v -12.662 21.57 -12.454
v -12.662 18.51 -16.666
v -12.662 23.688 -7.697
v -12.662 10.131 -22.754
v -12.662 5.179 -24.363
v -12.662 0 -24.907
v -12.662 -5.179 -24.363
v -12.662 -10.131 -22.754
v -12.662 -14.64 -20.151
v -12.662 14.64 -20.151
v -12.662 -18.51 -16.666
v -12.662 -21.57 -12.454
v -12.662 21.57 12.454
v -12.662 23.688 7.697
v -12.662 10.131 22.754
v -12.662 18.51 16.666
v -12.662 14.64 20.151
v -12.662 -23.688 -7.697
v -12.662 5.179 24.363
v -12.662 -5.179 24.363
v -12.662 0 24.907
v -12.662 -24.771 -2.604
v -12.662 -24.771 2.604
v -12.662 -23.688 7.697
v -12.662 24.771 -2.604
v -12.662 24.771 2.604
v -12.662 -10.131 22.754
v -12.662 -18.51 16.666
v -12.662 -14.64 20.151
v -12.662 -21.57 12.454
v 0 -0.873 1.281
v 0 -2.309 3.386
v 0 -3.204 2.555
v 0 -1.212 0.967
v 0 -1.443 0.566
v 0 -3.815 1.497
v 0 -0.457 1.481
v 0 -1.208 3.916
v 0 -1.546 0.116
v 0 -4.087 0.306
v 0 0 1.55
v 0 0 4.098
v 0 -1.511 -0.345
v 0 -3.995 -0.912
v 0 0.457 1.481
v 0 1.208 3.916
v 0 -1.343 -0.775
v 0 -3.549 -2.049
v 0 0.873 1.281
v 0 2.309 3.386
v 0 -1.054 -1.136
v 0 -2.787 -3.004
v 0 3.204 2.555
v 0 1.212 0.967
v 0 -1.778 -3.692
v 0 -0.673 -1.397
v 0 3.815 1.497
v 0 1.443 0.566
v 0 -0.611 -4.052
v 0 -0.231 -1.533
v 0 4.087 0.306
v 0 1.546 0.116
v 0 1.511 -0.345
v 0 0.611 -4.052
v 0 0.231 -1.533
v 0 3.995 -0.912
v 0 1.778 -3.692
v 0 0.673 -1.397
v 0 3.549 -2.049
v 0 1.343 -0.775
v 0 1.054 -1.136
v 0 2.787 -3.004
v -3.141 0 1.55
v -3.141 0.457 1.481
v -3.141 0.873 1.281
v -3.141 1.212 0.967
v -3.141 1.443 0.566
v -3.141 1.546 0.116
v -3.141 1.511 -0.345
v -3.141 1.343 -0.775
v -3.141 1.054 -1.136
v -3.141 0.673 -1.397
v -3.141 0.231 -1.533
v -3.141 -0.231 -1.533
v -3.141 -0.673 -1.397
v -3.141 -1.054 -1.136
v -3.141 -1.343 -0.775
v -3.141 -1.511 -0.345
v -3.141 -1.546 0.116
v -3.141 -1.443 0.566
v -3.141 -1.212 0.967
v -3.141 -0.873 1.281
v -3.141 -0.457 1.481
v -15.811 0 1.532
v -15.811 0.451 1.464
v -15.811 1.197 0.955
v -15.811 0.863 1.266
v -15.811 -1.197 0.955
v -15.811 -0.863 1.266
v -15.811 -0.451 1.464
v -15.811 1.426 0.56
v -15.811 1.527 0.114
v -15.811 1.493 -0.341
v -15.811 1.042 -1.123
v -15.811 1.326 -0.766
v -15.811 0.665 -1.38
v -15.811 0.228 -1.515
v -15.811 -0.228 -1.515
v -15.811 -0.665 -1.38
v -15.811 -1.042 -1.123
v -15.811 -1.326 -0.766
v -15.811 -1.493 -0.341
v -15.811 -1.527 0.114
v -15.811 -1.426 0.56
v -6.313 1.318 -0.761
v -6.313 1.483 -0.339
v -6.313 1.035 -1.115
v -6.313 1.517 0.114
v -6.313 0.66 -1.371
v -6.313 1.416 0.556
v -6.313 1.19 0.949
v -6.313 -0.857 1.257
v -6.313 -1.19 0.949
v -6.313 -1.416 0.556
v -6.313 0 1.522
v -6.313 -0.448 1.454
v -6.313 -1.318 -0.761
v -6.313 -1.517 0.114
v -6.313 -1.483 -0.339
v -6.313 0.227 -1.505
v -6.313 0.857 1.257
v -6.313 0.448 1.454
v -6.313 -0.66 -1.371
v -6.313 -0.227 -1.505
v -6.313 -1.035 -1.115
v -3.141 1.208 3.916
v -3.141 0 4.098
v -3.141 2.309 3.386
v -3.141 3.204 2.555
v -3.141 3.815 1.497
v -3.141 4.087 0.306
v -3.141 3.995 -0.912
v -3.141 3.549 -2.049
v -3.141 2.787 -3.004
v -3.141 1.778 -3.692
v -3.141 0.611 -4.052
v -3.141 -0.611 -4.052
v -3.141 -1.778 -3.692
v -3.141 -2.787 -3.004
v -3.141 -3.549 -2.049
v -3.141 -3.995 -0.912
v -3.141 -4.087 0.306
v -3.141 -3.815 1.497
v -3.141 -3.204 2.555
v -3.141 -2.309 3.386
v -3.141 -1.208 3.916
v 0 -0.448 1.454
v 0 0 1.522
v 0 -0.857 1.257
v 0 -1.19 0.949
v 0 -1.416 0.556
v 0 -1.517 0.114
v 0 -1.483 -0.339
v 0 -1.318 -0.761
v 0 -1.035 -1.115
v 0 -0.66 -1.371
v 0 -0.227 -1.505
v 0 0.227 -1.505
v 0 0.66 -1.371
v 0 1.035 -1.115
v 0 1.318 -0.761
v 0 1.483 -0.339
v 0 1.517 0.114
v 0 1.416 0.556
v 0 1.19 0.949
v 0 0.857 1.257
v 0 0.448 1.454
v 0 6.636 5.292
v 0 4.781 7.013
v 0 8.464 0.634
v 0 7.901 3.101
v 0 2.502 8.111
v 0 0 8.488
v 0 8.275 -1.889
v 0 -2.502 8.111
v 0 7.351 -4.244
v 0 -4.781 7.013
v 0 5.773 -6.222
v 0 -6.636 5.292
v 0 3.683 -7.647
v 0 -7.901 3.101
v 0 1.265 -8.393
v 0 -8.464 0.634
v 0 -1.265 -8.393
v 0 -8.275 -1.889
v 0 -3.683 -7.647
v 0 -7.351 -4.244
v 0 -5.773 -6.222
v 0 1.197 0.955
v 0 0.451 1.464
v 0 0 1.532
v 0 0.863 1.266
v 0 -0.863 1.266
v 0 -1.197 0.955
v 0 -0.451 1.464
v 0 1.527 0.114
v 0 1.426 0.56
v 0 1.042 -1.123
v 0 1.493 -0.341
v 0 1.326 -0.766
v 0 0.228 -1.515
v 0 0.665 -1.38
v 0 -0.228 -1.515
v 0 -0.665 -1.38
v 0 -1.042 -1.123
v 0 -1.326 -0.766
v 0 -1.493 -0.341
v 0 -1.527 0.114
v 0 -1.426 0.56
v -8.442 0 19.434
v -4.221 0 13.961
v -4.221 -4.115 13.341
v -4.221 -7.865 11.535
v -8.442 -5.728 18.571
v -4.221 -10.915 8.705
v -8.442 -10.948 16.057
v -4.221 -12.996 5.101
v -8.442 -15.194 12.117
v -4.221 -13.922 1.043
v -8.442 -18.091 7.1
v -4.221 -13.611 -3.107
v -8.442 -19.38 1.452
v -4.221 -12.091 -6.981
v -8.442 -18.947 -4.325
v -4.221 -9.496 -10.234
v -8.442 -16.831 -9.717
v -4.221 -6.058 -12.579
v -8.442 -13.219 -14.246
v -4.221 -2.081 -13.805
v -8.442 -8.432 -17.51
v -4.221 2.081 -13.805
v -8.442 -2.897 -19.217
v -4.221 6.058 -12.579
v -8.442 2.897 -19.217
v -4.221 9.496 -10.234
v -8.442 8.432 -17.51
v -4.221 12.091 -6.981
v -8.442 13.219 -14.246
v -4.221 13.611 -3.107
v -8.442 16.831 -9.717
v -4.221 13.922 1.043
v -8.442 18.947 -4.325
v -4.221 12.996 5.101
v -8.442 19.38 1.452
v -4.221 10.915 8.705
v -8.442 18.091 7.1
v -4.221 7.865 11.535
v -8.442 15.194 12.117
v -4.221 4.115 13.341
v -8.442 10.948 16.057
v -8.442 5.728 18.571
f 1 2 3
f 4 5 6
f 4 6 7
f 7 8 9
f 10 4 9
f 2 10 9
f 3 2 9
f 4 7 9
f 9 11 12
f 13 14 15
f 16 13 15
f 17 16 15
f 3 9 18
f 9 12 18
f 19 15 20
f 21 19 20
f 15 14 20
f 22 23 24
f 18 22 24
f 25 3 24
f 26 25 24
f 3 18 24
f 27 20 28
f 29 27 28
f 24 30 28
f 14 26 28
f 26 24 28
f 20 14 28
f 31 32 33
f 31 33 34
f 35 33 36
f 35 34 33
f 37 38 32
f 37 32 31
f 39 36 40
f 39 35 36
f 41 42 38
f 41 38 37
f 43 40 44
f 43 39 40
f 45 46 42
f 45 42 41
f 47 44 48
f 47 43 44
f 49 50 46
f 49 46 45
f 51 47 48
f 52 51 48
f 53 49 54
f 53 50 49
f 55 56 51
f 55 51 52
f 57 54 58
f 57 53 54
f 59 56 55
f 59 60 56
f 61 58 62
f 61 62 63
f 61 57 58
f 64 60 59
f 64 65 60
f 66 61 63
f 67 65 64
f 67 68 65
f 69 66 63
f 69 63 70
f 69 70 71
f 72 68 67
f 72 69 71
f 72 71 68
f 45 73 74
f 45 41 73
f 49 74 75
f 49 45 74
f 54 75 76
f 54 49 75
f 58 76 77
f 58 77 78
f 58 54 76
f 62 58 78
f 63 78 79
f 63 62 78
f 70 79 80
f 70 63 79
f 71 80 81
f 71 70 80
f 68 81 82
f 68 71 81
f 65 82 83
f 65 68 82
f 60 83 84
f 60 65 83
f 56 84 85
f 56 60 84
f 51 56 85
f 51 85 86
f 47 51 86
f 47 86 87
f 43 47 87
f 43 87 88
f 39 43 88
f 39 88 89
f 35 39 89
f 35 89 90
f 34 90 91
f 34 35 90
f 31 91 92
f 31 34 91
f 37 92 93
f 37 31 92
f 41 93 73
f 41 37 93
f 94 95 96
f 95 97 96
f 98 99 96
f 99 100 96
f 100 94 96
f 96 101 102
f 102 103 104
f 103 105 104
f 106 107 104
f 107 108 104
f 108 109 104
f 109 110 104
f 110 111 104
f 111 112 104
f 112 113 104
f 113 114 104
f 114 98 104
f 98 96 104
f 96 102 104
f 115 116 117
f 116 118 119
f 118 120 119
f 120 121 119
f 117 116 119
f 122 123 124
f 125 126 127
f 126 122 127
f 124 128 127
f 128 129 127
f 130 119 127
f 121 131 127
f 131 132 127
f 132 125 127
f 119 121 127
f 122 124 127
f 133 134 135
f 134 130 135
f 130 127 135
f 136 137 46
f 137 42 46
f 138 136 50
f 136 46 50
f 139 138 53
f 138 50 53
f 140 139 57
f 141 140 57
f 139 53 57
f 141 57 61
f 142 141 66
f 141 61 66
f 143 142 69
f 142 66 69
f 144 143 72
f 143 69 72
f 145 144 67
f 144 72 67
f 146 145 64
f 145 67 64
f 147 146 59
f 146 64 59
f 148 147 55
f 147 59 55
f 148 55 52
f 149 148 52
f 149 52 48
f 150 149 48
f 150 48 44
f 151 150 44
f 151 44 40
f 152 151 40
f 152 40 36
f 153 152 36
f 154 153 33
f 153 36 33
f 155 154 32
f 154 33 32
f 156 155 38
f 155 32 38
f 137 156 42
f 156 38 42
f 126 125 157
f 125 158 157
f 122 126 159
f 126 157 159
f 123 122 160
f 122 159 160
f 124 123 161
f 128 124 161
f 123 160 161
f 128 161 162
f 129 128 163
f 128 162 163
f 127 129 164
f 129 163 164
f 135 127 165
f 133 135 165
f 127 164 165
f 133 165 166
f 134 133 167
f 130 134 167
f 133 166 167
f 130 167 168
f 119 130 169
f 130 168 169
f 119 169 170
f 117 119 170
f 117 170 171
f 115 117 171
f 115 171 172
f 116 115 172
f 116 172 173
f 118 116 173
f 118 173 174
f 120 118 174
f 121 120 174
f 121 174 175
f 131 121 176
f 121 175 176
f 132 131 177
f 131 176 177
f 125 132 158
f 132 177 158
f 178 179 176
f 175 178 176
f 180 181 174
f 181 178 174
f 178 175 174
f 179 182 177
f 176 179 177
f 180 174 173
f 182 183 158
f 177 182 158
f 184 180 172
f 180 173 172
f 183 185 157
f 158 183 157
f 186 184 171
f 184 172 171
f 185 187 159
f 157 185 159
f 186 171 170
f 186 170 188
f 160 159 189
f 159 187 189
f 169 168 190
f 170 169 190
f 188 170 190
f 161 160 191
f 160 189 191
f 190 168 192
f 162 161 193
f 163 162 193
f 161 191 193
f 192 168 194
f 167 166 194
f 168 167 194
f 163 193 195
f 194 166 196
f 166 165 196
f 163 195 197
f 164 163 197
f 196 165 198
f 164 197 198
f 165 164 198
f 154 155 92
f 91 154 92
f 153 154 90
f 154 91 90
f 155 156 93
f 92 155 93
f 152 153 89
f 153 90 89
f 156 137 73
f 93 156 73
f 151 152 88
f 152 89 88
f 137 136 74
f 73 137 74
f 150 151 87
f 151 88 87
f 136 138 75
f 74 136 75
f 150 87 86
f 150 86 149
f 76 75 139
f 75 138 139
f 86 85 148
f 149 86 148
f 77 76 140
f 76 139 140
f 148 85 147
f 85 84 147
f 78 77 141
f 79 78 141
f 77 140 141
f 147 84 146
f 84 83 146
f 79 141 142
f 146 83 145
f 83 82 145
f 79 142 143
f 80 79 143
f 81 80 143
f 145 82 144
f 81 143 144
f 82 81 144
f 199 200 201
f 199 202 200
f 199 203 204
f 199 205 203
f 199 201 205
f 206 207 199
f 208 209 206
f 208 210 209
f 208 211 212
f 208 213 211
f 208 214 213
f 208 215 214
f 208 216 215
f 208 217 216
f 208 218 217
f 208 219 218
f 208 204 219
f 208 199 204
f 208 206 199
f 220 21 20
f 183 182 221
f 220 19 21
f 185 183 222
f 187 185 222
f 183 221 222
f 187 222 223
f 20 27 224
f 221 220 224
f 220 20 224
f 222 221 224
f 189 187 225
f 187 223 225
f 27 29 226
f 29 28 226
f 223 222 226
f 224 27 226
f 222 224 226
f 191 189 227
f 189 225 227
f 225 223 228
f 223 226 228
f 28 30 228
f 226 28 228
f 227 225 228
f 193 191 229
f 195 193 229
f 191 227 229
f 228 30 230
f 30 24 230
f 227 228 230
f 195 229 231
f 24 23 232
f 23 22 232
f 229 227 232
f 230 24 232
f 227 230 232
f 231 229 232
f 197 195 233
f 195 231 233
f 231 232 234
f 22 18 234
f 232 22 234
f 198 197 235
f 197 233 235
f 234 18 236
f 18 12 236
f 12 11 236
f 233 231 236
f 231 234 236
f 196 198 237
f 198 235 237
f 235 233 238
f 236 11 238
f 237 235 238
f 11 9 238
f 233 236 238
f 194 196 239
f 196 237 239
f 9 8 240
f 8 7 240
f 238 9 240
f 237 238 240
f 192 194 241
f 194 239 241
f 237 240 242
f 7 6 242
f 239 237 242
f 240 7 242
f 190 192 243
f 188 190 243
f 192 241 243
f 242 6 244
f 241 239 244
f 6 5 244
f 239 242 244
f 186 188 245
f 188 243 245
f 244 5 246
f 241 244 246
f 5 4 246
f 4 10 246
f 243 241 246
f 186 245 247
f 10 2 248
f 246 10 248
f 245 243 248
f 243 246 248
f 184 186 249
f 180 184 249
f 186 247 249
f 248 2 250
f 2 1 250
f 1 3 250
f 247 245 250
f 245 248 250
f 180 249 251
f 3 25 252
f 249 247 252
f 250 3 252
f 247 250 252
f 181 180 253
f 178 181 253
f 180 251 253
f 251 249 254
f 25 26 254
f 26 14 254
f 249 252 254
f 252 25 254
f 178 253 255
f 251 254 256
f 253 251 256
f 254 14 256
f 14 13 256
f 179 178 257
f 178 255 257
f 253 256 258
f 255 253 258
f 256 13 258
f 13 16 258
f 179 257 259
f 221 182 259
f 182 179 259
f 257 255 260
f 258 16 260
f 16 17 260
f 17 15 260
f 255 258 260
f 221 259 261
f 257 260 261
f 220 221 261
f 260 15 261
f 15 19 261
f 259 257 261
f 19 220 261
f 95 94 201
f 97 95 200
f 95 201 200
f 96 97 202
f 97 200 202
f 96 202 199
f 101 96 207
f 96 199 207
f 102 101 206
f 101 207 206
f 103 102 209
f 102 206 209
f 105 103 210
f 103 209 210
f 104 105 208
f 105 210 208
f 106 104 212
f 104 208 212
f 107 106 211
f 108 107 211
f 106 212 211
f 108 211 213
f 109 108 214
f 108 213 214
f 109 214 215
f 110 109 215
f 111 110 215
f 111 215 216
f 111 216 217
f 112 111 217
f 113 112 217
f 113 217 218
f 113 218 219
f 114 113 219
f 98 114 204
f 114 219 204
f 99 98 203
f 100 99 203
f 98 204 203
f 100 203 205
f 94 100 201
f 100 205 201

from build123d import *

# Parameters (mm, degrees)
F2_W = 15.8114507794
F2_H = 1.5316511272
F4_W = 3.1408506911
F4_H = 2.5479650358


with BuildPart() as f1:
    # F0 (on Front) → F1 (revolve)
    with BuildSketch(Plane.XZ):
        Polygon((-12.6624526456, 24.9074622989), (-12.6624526456, 0), (-6.3131642528, 0), (-6.3131642528, 1.5215113526), (0, 1.5215113526), (0, 8.4880171344), align=None)
    revolve(axis=Axis((-9.4878084492, 0, 0), (1, 0, 0)))


with BuildPart() as f3:
    # F2 (on Front) → F3 (revolve)
    with BuildSketch(Plane.XZ):
        with Locations((-7.9057253897, 0.7658255636)):
            Rectangle(F2_W, F2_H)
    revolve(axis=Axis((-7.9057253897, 0, 0), (-1, 0, 0)))


with BuildPart() as f5:
    # F4 (on Front) → F5 (revolve)
    with BuildSketch(Plane.XZ):
        with Locations((-1.5704253456, 2.8242102708)):
            Rectangle(F4_W, F4_H)
    revolve(axis=Axis((-1.6580830561, 0, 0), (-1, 0, 0)))


solid = Compound([f1.part, f3.part, f5.part])
